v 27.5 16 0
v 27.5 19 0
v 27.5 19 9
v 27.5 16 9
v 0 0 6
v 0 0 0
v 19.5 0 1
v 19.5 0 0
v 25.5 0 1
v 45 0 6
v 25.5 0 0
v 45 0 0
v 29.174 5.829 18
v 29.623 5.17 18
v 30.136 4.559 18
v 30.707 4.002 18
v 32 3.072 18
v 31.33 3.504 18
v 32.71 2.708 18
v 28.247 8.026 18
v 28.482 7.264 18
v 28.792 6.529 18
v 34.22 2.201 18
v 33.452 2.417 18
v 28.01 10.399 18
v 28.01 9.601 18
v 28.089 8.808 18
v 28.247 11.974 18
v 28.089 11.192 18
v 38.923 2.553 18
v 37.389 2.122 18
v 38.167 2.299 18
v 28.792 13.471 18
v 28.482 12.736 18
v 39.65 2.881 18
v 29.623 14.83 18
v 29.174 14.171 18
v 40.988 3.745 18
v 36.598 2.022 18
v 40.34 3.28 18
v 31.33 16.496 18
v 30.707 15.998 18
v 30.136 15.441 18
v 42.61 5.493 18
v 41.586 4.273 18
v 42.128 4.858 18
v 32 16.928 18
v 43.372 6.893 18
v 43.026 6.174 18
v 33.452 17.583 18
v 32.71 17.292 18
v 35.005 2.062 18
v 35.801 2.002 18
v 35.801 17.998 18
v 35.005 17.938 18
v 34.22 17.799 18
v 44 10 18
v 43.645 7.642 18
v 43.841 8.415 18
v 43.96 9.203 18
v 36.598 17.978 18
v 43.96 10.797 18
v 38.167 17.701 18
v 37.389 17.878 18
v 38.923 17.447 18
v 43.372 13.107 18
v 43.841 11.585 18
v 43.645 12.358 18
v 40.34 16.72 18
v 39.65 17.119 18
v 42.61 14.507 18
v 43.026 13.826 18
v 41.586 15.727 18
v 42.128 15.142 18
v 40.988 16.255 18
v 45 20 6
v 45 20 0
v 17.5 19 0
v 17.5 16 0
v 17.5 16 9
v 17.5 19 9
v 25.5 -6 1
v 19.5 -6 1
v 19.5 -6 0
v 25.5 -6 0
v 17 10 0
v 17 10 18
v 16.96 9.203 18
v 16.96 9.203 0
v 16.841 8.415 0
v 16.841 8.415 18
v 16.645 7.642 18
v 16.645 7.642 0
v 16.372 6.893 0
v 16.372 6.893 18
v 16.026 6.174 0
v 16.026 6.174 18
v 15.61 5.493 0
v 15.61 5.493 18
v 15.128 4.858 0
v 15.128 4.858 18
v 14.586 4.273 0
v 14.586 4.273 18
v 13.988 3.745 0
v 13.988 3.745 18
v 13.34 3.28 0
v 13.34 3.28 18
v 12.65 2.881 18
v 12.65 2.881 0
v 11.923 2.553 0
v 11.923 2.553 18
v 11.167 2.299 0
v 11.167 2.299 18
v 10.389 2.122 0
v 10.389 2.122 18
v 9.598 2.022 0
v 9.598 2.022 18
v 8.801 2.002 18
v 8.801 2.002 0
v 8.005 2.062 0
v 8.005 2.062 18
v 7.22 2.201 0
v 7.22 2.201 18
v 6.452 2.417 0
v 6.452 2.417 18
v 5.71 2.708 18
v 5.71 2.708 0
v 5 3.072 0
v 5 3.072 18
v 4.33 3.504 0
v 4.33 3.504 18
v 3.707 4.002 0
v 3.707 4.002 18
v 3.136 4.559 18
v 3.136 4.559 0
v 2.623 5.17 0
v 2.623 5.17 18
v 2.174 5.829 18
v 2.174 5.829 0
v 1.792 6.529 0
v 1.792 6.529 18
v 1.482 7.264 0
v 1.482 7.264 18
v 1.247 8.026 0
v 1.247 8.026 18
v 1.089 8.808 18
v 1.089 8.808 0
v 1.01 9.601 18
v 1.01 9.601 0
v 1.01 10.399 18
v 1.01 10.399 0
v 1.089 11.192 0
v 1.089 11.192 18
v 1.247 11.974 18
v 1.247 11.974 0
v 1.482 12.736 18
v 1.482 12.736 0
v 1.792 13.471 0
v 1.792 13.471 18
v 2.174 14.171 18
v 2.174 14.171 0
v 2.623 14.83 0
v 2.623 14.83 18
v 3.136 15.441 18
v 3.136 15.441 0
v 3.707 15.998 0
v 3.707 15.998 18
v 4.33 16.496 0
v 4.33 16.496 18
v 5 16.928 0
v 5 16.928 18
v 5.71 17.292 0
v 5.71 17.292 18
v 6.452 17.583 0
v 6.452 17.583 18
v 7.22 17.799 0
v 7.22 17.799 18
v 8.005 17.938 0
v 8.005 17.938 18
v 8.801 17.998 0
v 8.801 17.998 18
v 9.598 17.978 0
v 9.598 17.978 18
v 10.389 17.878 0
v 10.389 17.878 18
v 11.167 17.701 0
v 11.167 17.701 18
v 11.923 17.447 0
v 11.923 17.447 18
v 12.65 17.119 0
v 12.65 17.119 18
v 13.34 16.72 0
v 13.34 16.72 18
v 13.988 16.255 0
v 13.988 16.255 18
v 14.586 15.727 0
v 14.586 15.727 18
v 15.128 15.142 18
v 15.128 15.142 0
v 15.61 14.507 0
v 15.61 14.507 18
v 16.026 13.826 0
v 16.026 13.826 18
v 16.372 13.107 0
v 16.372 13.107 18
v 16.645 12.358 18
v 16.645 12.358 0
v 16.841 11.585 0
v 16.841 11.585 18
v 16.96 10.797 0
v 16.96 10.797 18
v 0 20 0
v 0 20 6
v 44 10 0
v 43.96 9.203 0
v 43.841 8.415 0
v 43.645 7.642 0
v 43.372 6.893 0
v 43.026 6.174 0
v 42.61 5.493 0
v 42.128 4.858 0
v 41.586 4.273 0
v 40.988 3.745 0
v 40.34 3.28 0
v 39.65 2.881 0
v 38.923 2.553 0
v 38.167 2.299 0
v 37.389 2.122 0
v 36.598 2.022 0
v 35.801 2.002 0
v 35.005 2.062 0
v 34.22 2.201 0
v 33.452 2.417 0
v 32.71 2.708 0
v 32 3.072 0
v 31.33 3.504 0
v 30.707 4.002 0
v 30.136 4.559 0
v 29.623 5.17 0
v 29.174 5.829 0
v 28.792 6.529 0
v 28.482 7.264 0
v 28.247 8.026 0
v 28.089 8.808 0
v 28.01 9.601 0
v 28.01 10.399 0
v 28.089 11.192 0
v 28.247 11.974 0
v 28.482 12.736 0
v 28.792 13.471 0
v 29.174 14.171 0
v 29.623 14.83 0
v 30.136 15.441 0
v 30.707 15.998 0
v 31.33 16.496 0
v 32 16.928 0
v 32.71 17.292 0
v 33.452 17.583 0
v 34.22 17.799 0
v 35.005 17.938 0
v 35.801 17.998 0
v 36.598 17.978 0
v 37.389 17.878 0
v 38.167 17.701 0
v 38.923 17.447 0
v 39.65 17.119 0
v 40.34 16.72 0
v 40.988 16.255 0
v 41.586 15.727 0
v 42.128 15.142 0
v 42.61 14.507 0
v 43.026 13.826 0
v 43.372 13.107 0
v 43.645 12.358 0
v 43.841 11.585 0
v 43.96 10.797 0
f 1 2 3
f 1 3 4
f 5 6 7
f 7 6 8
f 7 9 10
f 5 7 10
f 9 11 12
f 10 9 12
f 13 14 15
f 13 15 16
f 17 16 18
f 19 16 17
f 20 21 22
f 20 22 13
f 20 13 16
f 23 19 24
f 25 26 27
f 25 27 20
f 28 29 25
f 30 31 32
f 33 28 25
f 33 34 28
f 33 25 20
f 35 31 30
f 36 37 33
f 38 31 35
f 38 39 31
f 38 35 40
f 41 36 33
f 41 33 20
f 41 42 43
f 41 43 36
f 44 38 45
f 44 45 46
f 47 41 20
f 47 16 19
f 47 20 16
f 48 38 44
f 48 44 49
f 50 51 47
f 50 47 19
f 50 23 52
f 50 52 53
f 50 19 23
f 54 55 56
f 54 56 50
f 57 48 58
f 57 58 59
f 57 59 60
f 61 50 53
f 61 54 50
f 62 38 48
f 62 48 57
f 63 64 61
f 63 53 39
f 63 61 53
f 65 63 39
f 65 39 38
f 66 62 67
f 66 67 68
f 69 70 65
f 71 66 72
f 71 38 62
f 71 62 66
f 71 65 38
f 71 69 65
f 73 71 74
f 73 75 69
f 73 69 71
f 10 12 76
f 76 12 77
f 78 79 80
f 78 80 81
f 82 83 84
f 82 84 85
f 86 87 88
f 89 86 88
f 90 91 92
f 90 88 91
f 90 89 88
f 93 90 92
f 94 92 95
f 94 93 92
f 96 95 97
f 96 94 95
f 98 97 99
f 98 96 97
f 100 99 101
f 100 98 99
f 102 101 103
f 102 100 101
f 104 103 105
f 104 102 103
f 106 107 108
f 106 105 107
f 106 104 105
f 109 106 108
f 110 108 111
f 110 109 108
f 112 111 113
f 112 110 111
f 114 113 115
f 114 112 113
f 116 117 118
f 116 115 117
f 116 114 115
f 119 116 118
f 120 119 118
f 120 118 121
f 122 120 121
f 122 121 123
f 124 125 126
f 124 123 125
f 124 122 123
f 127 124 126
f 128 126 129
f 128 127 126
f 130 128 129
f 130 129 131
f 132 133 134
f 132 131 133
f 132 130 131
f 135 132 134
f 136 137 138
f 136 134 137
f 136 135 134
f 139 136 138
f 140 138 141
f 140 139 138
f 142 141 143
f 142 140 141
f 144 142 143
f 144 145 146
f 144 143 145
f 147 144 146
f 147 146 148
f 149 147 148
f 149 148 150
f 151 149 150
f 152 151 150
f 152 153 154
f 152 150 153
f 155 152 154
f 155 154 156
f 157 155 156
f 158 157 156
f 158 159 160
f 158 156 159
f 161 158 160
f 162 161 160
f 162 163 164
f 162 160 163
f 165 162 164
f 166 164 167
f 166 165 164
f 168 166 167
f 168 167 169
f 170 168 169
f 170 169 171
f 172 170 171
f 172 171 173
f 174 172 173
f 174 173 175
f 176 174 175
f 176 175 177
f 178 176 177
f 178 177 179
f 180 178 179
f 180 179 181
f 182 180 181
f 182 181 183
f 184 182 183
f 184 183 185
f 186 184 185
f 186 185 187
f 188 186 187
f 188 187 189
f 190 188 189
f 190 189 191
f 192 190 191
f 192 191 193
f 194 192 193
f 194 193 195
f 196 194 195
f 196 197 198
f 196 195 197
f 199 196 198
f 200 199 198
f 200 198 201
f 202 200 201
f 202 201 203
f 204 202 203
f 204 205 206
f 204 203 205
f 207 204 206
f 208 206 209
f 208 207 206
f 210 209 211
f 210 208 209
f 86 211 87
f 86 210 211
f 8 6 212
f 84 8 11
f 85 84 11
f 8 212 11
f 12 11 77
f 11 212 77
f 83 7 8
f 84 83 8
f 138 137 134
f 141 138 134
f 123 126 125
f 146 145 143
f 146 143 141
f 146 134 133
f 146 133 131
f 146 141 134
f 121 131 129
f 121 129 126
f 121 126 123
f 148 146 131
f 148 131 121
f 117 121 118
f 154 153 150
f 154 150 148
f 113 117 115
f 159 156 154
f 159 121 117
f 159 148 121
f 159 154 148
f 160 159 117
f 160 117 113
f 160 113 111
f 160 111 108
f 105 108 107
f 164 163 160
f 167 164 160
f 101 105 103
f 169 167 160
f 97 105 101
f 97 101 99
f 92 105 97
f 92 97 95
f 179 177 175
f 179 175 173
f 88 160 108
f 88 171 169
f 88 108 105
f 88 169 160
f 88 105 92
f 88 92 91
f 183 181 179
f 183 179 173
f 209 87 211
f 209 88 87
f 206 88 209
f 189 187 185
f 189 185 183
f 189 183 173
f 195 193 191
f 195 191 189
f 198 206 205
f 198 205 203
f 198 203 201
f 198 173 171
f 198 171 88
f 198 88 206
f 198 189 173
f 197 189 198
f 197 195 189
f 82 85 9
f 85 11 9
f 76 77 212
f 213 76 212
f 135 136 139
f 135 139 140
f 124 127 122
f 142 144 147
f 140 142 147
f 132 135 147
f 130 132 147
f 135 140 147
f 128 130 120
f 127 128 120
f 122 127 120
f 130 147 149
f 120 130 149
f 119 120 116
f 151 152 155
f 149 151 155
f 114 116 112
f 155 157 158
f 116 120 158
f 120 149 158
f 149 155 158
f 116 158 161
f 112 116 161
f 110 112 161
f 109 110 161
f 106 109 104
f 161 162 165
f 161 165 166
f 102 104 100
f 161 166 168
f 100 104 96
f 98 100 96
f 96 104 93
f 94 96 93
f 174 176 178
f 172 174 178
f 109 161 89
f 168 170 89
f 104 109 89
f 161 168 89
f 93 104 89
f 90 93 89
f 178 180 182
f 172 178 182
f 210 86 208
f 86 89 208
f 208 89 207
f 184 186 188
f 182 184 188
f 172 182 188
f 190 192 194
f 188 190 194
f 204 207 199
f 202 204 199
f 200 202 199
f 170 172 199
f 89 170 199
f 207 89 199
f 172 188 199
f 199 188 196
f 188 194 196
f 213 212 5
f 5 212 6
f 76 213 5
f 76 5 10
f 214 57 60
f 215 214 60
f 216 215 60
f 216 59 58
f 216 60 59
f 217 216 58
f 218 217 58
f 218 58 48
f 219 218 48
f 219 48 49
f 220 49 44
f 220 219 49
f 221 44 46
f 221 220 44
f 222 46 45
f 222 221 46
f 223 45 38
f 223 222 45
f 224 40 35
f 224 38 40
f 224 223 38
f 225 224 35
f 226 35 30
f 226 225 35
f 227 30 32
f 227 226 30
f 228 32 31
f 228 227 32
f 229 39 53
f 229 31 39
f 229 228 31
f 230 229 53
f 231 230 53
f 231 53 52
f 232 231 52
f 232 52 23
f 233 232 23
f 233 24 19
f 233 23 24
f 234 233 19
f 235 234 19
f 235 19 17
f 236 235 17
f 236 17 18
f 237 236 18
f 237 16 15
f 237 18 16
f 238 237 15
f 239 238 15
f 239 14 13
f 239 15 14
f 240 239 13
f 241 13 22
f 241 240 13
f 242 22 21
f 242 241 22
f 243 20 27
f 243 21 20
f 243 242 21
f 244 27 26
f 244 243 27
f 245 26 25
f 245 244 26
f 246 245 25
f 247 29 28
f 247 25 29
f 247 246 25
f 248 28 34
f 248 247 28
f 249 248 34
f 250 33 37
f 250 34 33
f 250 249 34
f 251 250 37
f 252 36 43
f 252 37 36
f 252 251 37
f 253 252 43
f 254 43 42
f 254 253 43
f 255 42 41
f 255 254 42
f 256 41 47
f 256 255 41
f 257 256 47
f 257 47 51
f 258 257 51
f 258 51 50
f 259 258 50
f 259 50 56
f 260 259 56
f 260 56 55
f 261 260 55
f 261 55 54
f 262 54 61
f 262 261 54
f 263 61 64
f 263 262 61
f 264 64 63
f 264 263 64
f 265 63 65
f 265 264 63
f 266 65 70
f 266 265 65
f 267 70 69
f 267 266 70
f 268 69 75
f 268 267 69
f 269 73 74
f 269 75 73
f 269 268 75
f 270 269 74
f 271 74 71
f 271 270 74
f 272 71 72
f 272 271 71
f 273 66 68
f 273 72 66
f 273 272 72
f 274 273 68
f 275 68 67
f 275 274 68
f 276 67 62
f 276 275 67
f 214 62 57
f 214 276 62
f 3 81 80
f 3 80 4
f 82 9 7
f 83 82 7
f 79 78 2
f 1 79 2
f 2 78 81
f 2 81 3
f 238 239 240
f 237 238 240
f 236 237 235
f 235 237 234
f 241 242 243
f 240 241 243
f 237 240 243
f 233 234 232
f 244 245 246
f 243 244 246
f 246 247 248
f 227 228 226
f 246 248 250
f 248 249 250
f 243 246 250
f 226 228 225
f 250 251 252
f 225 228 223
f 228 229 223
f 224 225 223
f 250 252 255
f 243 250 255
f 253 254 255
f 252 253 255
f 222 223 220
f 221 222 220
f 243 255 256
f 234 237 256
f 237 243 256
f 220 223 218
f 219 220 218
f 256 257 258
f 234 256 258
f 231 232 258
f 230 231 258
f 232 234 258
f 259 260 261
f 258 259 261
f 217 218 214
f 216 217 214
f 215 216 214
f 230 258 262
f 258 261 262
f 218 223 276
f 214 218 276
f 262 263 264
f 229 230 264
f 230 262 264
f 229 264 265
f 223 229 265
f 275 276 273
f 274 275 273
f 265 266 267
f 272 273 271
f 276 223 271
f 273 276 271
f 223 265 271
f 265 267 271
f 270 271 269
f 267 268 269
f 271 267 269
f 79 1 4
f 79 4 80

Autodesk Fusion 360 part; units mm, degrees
sketch "Sketch1" plane through (0, 0, 0) normal (0, 0, 1) x (1, 0, 0)
  line L0 (0, 0) -> (45, 0)
  line L1 (45, 0) -> (45, 20)
  line L2 (45, 20) -> (0, 20)
  line L3 (0, 20) -> (0, 0)
  line L4 (17.5, 19) -> (27.5, 19)
  line L5 (27.5, 19) -> (27.5, 16)
  line L6 (27.5, 16) -> (17.5, 16)
  line L7 (17.5, 16) -> (17.5, 19)
  circle A0 centre (9, 10) radius 8
  circle A1 centre (36, 10) radius 8
  dimension "d1" = 45
  dimension "d2" = 20
  dimension "d3" = 10
  dimension "d4" = 3
  dimension "d5" = 16
  dimension "d6" = 16
  dimension "d7" = 9
  dimension "d8" = 9
  dimension "d9" = 17.5
  dimension "d10" = 1
  dimension "d11" = 10
  dimension "d12" = 10
extrude "Extrude1" add sketch "Sketch1" along normal blind 6 contours L0 L1 L2 L3 | L4 L5 L6 L7 | A0 | A1 makes body 1
extrude "Extrude2" add sketch "Sketch1" along normal blind 18 separate body contours A0 makes body 2
extrude "Extrude3" add sketch "Sketch1" along normal blind 18 separate body contours A1 makes body 3
extrude "Extrude4" add sketch "Sketch1" along normal blind 9 separate body contours L4 L5 L6 L7 makes body 4
sketch "Sketch2" plane through (0, 0, 0) normal (0, -1, 0) x (1, 0, 0)
  line L0 (0, 0) -> (45, 0)
  line L1 (45, 0) -> (45, 6)
  line L2 (45, 6) -> (0, 6)
  line L3 (0, 6) -> (0, 0)
  line L4 (17.5, 0) -> (23.5, 0)
  line L5 (19.5, 0) -> (25.5, 0)
  line L6 (25.5, 0) -> (25.5, 1)
  line L7 (25.5, 1) -> (19.5, 1)
  line L8 (19.5, 1) -> (19.5, 0)
  dimension "d26" = 19.5
extrude "Extrude5" add sketch "Sketch2" along normal blind 6 contours L0 L4 L5 L6 L7 L8 bodies 1
